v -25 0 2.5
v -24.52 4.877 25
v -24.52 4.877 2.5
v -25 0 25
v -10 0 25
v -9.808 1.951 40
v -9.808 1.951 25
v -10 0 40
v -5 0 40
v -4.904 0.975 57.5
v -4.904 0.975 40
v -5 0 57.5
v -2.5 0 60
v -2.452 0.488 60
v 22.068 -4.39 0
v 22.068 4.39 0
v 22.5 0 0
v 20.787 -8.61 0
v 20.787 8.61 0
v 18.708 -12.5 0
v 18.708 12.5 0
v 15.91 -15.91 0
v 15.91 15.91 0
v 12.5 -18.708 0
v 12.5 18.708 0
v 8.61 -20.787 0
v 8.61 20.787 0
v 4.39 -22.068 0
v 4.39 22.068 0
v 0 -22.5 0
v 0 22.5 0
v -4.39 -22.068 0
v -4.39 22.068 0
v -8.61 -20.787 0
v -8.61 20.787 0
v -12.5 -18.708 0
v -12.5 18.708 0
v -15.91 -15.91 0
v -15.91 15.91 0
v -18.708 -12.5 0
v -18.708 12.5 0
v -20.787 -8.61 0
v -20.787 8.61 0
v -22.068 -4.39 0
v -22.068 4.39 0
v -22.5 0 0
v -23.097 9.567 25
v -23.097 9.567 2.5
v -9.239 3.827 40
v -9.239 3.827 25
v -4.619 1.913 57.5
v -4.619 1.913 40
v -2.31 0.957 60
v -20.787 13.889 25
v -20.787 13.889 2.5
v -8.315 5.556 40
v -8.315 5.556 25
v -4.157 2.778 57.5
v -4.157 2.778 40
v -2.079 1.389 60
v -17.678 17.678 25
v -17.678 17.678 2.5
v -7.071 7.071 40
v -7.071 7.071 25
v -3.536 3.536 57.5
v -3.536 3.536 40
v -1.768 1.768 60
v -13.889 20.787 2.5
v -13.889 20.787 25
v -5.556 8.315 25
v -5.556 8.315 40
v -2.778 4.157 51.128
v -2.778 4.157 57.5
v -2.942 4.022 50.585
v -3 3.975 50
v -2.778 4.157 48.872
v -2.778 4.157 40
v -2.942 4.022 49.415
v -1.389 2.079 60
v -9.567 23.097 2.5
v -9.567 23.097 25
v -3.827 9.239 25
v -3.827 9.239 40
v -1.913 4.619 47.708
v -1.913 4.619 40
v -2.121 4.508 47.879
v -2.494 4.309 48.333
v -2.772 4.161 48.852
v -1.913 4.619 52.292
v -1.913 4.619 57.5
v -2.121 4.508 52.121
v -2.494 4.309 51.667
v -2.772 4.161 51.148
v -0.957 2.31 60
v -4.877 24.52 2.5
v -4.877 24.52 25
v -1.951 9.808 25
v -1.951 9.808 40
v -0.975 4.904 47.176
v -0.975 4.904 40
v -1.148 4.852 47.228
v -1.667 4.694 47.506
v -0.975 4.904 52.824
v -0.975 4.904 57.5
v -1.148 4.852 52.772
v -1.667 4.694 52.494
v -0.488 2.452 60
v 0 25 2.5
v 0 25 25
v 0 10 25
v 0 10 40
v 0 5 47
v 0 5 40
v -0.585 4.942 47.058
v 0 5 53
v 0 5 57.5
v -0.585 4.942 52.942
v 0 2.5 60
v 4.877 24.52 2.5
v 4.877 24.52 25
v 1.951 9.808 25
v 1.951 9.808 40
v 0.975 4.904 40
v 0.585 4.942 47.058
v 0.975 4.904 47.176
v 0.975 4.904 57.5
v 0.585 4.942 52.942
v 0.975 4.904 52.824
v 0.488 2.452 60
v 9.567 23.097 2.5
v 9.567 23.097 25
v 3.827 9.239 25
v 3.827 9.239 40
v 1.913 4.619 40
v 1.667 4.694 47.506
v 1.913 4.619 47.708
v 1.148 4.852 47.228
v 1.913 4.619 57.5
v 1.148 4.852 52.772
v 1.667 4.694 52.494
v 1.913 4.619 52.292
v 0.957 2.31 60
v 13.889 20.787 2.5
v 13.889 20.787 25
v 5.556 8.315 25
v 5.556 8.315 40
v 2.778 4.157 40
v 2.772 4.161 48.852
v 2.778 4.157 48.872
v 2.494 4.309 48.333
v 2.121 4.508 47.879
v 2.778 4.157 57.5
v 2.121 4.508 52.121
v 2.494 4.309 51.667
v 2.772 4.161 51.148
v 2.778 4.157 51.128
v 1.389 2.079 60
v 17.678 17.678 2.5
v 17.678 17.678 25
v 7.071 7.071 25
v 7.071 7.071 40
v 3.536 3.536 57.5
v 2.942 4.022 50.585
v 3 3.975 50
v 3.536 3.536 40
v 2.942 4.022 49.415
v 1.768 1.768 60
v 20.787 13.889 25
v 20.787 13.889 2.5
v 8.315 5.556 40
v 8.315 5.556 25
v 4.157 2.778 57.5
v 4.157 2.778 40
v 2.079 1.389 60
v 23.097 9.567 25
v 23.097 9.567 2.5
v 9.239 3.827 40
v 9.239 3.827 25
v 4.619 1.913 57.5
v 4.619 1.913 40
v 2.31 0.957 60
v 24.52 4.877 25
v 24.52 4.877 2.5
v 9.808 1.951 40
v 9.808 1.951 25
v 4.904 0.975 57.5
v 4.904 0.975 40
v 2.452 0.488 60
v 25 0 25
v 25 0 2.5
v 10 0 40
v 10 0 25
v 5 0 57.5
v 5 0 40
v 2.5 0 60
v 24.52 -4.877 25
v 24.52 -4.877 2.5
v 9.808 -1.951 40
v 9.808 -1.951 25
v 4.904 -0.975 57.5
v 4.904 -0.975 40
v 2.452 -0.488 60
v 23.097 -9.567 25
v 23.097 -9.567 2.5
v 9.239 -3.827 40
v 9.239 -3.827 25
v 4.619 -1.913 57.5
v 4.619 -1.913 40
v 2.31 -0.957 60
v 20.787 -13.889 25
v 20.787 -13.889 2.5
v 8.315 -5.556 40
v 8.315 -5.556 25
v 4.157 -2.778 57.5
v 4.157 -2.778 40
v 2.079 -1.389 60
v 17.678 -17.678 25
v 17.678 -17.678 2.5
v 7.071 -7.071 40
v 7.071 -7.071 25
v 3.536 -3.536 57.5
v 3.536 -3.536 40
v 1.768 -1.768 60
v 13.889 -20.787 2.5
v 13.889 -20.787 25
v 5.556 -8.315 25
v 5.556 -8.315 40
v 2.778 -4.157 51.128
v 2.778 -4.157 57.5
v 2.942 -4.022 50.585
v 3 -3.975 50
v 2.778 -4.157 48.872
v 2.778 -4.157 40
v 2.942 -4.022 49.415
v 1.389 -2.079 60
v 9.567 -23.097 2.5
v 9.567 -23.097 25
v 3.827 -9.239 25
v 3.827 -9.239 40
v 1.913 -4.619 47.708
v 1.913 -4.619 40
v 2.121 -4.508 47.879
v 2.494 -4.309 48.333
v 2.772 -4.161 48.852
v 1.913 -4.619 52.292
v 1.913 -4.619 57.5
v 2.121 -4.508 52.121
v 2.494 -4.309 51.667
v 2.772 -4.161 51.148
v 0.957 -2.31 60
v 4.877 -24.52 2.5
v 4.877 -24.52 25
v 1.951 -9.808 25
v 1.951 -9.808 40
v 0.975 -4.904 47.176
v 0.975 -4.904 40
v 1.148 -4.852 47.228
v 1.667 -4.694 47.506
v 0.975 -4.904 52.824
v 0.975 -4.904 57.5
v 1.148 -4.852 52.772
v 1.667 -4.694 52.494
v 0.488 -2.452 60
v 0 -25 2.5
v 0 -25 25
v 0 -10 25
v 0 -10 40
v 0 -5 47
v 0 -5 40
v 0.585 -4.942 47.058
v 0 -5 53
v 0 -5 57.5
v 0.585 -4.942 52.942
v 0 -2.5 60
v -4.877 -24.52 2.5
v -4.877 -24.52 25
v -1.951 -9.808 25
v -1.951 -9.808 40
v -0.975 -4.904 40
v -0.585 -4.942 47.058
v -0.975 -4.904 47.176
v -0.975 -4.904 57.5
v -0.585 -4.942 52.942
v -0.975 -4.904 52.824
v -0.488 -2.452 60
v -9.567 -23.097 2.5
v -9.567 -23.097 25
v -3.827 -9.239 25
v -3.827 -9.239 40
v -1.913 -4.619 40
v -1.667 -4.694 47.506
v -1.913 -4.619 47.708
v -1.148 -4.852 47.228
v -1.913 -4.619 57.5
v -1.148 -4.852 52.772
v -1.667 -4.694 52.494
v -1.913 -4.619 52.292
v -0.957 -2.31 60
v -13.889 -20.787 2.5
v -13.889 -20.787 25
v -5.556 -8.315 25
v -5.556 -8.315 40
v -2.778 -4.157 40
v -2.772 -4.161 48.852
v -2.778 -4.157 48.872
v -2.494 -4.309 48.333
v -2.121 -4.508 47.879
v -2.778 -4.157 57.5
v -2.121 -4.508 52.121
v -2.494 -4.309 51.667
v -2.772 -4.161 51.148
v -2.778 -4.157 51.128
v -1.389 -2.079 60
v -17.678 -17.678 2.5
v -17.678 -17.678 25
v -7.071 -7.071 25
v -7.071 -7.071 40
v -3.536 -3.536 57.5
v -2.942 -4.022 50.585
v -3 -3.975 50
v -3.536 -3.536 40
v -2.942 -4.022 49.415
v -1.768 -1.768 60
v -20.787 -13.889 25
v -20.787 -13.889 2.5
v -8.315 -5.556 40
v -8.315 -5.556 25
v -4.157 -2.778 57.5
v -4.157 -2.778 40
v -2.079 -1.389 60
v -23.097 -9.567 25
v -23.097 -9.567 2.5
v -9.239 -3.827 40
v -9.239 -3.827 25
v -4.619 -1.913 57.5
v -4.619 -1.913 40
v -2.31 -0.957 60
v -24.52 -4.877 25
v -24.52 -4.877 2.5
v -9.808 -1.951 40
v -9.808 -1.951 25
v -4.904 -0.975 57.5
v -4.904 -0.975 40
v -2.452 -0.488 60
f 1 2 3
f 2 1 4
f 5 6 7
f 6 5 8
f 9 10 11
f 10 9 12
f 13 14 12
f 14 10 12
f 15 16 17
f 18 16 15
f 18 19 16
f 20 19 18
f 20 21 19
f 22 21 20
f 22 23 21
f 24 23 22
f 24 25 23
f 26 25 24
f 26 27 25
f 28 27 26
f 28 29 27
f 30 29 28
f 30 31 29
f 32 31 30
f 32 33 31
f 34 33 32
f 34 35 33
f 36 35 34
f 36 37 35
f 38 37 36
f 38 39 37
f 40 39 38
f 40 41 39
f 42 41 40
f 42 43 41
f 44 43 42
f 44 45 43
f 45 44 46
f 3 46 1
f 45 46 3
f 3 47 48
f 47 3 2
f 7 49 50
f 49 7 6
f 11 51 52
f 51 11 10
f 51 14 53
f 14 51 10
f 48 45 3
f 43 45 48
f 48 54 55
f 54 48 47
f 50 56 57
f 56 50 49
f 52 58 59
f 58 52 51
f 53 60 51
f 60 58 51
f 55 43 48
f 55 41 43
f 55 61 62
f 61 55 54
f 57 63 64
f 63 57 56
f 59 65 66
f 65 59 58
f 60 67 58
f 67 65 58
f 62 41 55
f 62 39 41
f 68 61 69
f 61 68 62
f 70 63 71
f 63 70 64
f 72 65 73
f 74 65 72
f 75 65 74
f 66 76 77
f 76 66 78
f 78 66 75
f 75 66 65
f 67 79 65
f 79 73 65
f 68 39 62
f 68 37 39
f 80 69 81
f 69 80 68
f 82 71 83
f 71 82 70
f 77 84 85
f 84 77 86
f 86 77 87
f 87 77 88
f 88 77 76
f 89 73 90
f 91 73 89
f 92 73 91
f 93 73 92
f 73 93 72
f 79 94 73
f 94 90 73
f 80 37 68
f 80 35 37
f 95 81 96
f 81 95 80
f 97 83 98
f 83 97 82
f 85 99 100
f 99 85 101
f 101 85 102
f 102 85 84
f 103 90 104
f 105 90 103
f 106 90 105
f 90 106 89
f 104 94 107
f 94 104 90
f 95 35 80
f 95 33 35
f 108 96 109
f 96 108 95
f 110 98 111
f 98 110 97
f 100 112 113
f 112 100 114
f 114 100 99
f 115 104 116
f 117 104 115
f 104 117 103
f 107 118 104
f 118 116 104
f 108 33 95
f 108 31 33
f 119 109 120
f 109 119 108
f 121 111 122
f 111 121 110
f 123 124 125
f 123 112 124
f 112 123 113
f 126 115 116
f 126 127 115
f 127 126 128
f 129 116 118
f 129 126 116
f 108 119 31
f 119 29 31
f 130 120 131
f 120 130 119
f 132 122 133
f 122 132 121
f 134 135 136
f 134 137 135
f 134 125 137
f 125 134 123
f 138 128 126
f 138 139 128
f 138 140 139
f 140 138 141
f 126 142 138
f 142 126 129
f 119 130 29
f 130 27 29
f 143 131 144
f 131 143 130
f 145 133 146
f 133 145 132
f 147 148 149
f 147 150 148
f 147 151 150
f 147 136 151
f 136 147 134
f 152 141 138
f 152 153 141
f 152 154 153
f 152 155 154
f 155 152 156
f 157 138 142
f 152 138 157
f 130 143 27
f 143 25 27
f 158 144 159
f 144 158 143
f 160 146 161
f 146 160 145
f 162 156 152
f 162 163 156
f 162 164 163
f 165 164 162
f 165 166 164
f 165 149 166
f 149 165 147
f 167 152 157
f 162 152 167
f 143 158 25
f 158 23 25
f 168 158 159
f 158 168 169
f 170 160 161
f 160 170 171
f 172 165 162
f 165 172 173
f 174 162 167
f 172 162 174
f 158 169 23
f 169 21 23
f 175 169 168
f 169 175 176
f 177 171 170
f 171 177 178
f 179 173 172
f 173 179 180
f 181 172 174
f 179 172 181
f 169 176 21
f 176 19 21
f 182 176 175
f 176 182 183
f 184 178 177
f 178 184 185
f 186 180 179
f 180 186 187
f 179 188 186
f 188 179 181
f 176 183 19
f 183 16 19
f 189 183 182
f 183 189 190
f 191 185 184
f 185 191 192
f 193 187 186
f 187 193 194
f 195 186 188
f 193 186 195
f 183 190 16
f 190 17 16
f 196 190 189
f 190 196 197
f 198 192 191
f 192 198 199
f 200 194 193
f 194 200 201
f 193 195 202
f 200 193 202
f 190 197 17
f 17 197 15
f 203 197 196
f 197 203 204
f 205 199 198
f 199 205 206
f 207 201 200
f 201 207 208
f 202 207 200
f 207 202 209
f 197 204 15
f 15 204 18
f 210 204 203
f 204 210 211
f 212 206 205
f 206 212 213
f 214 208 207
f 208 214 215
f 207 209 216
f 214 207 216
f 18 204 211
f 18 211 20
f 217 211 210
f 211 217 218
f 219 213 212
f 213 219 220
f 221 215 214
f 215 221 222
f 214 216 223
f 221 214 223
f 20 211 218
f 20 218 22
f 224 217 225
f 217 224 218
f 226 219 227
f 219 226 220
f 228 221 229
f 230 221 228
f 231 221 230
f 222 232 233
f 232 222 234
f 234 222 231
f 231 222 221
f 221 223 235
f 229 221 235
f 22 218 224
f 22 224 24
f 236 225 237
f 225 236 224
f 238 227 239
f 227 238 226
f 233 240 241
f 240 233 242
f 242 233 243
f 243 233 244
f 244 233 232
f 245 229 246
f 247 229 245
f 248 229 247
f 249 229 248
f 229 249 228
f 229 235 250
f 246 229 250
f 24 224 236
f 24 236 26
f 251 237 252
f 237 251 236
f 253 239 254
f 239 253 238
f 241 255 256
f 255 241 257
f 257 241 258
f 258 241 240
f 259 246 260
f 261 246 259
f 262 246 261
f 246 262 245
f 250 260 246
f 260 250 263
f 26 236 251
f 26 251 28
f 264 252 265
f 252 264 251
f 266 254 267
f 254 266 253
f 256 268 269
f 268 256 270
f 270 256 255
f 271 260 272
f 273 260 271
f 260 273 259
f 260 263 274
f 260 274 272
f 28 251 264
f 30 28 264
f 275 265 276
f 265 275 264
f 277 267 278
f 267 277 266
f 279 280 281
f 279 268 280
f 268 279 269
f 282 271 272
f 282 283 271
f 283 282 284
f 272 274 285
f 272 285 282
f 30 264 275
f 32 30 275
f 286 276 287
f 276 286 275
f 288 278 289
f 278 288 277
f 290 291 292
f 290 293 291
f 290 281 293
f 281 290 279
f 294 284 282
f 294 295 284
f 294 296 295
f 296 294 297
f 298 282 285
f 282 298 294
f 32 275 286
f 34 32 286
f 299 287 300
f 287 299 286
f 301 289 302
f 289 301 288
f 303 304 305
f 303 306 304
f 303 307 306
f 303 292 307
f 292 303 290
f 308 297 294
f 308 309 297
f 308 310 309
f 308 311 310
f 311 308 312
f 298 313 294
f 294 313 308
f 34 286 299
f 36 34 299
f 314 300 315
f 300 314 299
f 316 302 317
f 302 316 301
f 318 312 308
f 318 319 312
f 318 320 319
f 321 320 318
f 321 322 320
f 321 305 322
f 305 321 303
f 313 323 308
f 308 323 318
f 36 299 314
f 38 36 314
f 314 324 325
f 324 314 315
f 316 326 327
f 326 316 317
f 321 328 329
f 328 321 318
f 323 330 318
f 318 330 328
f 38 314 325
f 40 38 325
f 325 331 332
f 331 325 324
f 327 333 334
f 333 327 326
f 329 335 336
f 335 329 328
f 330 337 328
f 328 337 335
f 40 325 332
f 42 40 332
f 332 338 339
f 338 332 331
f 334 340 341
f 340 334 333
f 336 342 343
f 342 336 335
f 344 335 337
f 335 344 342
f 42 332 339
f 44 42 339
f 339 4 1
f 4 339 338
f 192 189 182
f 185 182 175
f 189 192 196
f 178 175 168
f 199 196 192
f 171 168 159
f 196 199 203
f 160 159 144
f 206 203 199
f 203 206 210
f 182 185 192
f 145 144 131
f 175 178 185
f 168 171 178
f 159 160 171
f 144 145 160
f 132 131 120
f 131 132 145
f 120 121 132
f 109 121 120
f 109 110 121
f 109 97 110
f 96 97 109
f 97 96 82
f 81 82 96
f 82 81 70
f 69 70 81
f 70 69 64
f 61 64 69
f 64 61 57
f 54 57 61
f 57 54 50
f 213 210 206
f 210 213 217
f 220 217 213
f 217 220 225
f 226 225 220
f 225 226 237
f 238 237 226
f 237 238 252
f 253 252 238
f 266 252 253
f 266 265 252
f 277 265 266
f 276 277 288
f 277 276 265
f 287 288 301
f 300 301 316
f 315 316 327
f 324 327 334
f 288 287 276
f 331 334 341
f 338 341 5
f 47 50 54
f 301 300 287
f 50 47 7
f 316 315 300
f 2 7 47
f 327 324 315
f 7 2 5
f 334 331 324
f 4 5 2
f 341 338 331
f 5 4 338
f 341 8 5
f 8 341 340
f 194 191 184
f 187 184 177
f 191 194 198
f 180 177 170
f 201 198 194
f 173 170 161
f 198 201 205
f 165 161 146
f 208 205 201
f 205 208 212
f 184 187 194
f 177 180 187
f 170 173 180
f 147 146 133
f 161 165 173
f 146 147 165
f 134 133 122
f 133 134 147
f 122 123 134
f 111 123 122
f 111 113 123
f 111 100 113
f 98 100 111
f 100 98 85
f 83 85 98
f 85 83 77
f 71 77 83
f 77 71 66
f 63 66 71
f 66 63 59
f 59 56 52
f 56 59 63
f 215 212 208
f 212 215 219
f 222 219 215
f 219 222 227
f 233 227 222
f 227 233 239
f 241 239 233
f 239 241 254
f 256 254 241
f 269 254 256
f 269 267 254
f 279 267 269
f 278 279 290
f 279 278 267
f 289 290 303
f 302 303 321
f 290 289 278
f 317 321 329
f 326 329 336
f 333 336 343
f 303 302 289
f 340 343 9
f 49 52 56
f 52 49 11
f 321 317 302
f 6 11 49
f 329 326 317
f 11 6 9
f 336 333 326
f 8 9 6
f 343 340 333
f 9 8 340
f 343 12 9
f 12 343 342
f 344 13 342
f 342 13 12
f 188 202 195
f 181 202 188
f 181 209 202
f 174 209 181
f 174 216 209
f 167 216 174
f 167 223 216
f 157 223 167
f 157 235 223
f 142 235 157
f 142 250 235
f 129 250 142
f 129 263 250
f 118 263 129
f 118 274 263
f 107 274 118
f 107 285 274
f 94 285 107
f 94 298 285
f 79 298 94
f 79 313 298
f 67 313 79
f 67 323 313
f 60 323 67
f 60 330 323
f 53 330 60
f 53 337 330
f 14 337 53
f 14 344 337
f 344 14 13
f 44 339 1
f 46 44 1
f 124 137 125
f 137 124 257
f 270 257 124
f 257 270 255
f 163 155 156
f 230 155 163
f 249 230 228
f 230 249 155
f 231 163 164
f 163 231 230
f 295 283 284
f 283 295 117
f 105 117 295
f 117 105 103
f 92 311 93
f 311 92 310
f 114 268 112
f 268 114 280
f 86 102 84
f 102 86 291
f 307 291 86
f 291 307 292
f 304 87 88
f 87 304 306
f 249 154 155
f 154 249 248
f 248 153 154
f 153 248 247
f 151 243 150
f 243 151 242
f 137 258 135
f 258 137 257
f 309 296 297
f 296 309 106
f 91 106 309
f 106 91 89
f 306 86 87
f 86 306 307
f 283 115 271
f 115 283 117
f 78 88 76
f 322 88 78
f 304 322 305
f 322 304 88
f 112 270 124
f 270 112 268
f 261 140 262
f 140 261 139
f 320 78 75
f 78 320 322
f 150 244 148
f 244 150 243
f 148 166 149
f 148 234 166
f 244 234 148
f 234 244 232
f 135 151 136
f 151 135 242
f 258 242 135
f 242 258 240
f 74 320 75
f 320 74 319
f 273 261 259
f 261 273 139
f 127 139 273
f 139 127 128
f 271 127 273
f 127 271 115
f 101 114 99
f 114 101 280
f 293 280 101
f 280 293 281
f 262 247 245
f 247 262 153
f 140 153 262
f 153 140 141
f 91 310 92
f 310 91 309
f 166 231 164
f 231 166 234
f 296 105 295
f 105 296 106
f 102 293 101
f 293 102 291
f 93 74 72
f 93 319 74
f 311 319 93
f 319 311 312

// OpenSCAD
$fn = 32;

// ----------------------------------------------------------------------
// Stepped shaft: diameters 50, 20, 10 mm, 60 mm long
// ----------------------------------------------------------------------

// --- parameters (mm) ---
d1 = 50;                  // step 1 diameter
len1 = 25;                // step 1 length
d2 = 20;                  // step 2 diameter
len2 = 15;                // step 2 length
d3 = 10;                  // step 3 diameter
len3 = 20;                // step 3 length
total = 60;               // overall length
chamfer = 2.5;            // end chamfer
cross_d = 6;              // cross pin hole
cross_z = 50;             // cross hole position

/* closed turning profile: x is the radius, y is the length */
profile = [[0, 0], [25 - chamfer, 0], [25, chamfer], [25, 25], [10, 25], [10, 40], [5, 40], [5, 57.5], [2.5, 60], [0, 60]];

difference() {
  rotate_extrude() polygon(profile);
  /* cross pin hole through the small step */
  translate([0, 0, cross_z]) rotate([90, 0, 0]) cylinder(h = d3 + 4, d = cross_d, center = true);
}
